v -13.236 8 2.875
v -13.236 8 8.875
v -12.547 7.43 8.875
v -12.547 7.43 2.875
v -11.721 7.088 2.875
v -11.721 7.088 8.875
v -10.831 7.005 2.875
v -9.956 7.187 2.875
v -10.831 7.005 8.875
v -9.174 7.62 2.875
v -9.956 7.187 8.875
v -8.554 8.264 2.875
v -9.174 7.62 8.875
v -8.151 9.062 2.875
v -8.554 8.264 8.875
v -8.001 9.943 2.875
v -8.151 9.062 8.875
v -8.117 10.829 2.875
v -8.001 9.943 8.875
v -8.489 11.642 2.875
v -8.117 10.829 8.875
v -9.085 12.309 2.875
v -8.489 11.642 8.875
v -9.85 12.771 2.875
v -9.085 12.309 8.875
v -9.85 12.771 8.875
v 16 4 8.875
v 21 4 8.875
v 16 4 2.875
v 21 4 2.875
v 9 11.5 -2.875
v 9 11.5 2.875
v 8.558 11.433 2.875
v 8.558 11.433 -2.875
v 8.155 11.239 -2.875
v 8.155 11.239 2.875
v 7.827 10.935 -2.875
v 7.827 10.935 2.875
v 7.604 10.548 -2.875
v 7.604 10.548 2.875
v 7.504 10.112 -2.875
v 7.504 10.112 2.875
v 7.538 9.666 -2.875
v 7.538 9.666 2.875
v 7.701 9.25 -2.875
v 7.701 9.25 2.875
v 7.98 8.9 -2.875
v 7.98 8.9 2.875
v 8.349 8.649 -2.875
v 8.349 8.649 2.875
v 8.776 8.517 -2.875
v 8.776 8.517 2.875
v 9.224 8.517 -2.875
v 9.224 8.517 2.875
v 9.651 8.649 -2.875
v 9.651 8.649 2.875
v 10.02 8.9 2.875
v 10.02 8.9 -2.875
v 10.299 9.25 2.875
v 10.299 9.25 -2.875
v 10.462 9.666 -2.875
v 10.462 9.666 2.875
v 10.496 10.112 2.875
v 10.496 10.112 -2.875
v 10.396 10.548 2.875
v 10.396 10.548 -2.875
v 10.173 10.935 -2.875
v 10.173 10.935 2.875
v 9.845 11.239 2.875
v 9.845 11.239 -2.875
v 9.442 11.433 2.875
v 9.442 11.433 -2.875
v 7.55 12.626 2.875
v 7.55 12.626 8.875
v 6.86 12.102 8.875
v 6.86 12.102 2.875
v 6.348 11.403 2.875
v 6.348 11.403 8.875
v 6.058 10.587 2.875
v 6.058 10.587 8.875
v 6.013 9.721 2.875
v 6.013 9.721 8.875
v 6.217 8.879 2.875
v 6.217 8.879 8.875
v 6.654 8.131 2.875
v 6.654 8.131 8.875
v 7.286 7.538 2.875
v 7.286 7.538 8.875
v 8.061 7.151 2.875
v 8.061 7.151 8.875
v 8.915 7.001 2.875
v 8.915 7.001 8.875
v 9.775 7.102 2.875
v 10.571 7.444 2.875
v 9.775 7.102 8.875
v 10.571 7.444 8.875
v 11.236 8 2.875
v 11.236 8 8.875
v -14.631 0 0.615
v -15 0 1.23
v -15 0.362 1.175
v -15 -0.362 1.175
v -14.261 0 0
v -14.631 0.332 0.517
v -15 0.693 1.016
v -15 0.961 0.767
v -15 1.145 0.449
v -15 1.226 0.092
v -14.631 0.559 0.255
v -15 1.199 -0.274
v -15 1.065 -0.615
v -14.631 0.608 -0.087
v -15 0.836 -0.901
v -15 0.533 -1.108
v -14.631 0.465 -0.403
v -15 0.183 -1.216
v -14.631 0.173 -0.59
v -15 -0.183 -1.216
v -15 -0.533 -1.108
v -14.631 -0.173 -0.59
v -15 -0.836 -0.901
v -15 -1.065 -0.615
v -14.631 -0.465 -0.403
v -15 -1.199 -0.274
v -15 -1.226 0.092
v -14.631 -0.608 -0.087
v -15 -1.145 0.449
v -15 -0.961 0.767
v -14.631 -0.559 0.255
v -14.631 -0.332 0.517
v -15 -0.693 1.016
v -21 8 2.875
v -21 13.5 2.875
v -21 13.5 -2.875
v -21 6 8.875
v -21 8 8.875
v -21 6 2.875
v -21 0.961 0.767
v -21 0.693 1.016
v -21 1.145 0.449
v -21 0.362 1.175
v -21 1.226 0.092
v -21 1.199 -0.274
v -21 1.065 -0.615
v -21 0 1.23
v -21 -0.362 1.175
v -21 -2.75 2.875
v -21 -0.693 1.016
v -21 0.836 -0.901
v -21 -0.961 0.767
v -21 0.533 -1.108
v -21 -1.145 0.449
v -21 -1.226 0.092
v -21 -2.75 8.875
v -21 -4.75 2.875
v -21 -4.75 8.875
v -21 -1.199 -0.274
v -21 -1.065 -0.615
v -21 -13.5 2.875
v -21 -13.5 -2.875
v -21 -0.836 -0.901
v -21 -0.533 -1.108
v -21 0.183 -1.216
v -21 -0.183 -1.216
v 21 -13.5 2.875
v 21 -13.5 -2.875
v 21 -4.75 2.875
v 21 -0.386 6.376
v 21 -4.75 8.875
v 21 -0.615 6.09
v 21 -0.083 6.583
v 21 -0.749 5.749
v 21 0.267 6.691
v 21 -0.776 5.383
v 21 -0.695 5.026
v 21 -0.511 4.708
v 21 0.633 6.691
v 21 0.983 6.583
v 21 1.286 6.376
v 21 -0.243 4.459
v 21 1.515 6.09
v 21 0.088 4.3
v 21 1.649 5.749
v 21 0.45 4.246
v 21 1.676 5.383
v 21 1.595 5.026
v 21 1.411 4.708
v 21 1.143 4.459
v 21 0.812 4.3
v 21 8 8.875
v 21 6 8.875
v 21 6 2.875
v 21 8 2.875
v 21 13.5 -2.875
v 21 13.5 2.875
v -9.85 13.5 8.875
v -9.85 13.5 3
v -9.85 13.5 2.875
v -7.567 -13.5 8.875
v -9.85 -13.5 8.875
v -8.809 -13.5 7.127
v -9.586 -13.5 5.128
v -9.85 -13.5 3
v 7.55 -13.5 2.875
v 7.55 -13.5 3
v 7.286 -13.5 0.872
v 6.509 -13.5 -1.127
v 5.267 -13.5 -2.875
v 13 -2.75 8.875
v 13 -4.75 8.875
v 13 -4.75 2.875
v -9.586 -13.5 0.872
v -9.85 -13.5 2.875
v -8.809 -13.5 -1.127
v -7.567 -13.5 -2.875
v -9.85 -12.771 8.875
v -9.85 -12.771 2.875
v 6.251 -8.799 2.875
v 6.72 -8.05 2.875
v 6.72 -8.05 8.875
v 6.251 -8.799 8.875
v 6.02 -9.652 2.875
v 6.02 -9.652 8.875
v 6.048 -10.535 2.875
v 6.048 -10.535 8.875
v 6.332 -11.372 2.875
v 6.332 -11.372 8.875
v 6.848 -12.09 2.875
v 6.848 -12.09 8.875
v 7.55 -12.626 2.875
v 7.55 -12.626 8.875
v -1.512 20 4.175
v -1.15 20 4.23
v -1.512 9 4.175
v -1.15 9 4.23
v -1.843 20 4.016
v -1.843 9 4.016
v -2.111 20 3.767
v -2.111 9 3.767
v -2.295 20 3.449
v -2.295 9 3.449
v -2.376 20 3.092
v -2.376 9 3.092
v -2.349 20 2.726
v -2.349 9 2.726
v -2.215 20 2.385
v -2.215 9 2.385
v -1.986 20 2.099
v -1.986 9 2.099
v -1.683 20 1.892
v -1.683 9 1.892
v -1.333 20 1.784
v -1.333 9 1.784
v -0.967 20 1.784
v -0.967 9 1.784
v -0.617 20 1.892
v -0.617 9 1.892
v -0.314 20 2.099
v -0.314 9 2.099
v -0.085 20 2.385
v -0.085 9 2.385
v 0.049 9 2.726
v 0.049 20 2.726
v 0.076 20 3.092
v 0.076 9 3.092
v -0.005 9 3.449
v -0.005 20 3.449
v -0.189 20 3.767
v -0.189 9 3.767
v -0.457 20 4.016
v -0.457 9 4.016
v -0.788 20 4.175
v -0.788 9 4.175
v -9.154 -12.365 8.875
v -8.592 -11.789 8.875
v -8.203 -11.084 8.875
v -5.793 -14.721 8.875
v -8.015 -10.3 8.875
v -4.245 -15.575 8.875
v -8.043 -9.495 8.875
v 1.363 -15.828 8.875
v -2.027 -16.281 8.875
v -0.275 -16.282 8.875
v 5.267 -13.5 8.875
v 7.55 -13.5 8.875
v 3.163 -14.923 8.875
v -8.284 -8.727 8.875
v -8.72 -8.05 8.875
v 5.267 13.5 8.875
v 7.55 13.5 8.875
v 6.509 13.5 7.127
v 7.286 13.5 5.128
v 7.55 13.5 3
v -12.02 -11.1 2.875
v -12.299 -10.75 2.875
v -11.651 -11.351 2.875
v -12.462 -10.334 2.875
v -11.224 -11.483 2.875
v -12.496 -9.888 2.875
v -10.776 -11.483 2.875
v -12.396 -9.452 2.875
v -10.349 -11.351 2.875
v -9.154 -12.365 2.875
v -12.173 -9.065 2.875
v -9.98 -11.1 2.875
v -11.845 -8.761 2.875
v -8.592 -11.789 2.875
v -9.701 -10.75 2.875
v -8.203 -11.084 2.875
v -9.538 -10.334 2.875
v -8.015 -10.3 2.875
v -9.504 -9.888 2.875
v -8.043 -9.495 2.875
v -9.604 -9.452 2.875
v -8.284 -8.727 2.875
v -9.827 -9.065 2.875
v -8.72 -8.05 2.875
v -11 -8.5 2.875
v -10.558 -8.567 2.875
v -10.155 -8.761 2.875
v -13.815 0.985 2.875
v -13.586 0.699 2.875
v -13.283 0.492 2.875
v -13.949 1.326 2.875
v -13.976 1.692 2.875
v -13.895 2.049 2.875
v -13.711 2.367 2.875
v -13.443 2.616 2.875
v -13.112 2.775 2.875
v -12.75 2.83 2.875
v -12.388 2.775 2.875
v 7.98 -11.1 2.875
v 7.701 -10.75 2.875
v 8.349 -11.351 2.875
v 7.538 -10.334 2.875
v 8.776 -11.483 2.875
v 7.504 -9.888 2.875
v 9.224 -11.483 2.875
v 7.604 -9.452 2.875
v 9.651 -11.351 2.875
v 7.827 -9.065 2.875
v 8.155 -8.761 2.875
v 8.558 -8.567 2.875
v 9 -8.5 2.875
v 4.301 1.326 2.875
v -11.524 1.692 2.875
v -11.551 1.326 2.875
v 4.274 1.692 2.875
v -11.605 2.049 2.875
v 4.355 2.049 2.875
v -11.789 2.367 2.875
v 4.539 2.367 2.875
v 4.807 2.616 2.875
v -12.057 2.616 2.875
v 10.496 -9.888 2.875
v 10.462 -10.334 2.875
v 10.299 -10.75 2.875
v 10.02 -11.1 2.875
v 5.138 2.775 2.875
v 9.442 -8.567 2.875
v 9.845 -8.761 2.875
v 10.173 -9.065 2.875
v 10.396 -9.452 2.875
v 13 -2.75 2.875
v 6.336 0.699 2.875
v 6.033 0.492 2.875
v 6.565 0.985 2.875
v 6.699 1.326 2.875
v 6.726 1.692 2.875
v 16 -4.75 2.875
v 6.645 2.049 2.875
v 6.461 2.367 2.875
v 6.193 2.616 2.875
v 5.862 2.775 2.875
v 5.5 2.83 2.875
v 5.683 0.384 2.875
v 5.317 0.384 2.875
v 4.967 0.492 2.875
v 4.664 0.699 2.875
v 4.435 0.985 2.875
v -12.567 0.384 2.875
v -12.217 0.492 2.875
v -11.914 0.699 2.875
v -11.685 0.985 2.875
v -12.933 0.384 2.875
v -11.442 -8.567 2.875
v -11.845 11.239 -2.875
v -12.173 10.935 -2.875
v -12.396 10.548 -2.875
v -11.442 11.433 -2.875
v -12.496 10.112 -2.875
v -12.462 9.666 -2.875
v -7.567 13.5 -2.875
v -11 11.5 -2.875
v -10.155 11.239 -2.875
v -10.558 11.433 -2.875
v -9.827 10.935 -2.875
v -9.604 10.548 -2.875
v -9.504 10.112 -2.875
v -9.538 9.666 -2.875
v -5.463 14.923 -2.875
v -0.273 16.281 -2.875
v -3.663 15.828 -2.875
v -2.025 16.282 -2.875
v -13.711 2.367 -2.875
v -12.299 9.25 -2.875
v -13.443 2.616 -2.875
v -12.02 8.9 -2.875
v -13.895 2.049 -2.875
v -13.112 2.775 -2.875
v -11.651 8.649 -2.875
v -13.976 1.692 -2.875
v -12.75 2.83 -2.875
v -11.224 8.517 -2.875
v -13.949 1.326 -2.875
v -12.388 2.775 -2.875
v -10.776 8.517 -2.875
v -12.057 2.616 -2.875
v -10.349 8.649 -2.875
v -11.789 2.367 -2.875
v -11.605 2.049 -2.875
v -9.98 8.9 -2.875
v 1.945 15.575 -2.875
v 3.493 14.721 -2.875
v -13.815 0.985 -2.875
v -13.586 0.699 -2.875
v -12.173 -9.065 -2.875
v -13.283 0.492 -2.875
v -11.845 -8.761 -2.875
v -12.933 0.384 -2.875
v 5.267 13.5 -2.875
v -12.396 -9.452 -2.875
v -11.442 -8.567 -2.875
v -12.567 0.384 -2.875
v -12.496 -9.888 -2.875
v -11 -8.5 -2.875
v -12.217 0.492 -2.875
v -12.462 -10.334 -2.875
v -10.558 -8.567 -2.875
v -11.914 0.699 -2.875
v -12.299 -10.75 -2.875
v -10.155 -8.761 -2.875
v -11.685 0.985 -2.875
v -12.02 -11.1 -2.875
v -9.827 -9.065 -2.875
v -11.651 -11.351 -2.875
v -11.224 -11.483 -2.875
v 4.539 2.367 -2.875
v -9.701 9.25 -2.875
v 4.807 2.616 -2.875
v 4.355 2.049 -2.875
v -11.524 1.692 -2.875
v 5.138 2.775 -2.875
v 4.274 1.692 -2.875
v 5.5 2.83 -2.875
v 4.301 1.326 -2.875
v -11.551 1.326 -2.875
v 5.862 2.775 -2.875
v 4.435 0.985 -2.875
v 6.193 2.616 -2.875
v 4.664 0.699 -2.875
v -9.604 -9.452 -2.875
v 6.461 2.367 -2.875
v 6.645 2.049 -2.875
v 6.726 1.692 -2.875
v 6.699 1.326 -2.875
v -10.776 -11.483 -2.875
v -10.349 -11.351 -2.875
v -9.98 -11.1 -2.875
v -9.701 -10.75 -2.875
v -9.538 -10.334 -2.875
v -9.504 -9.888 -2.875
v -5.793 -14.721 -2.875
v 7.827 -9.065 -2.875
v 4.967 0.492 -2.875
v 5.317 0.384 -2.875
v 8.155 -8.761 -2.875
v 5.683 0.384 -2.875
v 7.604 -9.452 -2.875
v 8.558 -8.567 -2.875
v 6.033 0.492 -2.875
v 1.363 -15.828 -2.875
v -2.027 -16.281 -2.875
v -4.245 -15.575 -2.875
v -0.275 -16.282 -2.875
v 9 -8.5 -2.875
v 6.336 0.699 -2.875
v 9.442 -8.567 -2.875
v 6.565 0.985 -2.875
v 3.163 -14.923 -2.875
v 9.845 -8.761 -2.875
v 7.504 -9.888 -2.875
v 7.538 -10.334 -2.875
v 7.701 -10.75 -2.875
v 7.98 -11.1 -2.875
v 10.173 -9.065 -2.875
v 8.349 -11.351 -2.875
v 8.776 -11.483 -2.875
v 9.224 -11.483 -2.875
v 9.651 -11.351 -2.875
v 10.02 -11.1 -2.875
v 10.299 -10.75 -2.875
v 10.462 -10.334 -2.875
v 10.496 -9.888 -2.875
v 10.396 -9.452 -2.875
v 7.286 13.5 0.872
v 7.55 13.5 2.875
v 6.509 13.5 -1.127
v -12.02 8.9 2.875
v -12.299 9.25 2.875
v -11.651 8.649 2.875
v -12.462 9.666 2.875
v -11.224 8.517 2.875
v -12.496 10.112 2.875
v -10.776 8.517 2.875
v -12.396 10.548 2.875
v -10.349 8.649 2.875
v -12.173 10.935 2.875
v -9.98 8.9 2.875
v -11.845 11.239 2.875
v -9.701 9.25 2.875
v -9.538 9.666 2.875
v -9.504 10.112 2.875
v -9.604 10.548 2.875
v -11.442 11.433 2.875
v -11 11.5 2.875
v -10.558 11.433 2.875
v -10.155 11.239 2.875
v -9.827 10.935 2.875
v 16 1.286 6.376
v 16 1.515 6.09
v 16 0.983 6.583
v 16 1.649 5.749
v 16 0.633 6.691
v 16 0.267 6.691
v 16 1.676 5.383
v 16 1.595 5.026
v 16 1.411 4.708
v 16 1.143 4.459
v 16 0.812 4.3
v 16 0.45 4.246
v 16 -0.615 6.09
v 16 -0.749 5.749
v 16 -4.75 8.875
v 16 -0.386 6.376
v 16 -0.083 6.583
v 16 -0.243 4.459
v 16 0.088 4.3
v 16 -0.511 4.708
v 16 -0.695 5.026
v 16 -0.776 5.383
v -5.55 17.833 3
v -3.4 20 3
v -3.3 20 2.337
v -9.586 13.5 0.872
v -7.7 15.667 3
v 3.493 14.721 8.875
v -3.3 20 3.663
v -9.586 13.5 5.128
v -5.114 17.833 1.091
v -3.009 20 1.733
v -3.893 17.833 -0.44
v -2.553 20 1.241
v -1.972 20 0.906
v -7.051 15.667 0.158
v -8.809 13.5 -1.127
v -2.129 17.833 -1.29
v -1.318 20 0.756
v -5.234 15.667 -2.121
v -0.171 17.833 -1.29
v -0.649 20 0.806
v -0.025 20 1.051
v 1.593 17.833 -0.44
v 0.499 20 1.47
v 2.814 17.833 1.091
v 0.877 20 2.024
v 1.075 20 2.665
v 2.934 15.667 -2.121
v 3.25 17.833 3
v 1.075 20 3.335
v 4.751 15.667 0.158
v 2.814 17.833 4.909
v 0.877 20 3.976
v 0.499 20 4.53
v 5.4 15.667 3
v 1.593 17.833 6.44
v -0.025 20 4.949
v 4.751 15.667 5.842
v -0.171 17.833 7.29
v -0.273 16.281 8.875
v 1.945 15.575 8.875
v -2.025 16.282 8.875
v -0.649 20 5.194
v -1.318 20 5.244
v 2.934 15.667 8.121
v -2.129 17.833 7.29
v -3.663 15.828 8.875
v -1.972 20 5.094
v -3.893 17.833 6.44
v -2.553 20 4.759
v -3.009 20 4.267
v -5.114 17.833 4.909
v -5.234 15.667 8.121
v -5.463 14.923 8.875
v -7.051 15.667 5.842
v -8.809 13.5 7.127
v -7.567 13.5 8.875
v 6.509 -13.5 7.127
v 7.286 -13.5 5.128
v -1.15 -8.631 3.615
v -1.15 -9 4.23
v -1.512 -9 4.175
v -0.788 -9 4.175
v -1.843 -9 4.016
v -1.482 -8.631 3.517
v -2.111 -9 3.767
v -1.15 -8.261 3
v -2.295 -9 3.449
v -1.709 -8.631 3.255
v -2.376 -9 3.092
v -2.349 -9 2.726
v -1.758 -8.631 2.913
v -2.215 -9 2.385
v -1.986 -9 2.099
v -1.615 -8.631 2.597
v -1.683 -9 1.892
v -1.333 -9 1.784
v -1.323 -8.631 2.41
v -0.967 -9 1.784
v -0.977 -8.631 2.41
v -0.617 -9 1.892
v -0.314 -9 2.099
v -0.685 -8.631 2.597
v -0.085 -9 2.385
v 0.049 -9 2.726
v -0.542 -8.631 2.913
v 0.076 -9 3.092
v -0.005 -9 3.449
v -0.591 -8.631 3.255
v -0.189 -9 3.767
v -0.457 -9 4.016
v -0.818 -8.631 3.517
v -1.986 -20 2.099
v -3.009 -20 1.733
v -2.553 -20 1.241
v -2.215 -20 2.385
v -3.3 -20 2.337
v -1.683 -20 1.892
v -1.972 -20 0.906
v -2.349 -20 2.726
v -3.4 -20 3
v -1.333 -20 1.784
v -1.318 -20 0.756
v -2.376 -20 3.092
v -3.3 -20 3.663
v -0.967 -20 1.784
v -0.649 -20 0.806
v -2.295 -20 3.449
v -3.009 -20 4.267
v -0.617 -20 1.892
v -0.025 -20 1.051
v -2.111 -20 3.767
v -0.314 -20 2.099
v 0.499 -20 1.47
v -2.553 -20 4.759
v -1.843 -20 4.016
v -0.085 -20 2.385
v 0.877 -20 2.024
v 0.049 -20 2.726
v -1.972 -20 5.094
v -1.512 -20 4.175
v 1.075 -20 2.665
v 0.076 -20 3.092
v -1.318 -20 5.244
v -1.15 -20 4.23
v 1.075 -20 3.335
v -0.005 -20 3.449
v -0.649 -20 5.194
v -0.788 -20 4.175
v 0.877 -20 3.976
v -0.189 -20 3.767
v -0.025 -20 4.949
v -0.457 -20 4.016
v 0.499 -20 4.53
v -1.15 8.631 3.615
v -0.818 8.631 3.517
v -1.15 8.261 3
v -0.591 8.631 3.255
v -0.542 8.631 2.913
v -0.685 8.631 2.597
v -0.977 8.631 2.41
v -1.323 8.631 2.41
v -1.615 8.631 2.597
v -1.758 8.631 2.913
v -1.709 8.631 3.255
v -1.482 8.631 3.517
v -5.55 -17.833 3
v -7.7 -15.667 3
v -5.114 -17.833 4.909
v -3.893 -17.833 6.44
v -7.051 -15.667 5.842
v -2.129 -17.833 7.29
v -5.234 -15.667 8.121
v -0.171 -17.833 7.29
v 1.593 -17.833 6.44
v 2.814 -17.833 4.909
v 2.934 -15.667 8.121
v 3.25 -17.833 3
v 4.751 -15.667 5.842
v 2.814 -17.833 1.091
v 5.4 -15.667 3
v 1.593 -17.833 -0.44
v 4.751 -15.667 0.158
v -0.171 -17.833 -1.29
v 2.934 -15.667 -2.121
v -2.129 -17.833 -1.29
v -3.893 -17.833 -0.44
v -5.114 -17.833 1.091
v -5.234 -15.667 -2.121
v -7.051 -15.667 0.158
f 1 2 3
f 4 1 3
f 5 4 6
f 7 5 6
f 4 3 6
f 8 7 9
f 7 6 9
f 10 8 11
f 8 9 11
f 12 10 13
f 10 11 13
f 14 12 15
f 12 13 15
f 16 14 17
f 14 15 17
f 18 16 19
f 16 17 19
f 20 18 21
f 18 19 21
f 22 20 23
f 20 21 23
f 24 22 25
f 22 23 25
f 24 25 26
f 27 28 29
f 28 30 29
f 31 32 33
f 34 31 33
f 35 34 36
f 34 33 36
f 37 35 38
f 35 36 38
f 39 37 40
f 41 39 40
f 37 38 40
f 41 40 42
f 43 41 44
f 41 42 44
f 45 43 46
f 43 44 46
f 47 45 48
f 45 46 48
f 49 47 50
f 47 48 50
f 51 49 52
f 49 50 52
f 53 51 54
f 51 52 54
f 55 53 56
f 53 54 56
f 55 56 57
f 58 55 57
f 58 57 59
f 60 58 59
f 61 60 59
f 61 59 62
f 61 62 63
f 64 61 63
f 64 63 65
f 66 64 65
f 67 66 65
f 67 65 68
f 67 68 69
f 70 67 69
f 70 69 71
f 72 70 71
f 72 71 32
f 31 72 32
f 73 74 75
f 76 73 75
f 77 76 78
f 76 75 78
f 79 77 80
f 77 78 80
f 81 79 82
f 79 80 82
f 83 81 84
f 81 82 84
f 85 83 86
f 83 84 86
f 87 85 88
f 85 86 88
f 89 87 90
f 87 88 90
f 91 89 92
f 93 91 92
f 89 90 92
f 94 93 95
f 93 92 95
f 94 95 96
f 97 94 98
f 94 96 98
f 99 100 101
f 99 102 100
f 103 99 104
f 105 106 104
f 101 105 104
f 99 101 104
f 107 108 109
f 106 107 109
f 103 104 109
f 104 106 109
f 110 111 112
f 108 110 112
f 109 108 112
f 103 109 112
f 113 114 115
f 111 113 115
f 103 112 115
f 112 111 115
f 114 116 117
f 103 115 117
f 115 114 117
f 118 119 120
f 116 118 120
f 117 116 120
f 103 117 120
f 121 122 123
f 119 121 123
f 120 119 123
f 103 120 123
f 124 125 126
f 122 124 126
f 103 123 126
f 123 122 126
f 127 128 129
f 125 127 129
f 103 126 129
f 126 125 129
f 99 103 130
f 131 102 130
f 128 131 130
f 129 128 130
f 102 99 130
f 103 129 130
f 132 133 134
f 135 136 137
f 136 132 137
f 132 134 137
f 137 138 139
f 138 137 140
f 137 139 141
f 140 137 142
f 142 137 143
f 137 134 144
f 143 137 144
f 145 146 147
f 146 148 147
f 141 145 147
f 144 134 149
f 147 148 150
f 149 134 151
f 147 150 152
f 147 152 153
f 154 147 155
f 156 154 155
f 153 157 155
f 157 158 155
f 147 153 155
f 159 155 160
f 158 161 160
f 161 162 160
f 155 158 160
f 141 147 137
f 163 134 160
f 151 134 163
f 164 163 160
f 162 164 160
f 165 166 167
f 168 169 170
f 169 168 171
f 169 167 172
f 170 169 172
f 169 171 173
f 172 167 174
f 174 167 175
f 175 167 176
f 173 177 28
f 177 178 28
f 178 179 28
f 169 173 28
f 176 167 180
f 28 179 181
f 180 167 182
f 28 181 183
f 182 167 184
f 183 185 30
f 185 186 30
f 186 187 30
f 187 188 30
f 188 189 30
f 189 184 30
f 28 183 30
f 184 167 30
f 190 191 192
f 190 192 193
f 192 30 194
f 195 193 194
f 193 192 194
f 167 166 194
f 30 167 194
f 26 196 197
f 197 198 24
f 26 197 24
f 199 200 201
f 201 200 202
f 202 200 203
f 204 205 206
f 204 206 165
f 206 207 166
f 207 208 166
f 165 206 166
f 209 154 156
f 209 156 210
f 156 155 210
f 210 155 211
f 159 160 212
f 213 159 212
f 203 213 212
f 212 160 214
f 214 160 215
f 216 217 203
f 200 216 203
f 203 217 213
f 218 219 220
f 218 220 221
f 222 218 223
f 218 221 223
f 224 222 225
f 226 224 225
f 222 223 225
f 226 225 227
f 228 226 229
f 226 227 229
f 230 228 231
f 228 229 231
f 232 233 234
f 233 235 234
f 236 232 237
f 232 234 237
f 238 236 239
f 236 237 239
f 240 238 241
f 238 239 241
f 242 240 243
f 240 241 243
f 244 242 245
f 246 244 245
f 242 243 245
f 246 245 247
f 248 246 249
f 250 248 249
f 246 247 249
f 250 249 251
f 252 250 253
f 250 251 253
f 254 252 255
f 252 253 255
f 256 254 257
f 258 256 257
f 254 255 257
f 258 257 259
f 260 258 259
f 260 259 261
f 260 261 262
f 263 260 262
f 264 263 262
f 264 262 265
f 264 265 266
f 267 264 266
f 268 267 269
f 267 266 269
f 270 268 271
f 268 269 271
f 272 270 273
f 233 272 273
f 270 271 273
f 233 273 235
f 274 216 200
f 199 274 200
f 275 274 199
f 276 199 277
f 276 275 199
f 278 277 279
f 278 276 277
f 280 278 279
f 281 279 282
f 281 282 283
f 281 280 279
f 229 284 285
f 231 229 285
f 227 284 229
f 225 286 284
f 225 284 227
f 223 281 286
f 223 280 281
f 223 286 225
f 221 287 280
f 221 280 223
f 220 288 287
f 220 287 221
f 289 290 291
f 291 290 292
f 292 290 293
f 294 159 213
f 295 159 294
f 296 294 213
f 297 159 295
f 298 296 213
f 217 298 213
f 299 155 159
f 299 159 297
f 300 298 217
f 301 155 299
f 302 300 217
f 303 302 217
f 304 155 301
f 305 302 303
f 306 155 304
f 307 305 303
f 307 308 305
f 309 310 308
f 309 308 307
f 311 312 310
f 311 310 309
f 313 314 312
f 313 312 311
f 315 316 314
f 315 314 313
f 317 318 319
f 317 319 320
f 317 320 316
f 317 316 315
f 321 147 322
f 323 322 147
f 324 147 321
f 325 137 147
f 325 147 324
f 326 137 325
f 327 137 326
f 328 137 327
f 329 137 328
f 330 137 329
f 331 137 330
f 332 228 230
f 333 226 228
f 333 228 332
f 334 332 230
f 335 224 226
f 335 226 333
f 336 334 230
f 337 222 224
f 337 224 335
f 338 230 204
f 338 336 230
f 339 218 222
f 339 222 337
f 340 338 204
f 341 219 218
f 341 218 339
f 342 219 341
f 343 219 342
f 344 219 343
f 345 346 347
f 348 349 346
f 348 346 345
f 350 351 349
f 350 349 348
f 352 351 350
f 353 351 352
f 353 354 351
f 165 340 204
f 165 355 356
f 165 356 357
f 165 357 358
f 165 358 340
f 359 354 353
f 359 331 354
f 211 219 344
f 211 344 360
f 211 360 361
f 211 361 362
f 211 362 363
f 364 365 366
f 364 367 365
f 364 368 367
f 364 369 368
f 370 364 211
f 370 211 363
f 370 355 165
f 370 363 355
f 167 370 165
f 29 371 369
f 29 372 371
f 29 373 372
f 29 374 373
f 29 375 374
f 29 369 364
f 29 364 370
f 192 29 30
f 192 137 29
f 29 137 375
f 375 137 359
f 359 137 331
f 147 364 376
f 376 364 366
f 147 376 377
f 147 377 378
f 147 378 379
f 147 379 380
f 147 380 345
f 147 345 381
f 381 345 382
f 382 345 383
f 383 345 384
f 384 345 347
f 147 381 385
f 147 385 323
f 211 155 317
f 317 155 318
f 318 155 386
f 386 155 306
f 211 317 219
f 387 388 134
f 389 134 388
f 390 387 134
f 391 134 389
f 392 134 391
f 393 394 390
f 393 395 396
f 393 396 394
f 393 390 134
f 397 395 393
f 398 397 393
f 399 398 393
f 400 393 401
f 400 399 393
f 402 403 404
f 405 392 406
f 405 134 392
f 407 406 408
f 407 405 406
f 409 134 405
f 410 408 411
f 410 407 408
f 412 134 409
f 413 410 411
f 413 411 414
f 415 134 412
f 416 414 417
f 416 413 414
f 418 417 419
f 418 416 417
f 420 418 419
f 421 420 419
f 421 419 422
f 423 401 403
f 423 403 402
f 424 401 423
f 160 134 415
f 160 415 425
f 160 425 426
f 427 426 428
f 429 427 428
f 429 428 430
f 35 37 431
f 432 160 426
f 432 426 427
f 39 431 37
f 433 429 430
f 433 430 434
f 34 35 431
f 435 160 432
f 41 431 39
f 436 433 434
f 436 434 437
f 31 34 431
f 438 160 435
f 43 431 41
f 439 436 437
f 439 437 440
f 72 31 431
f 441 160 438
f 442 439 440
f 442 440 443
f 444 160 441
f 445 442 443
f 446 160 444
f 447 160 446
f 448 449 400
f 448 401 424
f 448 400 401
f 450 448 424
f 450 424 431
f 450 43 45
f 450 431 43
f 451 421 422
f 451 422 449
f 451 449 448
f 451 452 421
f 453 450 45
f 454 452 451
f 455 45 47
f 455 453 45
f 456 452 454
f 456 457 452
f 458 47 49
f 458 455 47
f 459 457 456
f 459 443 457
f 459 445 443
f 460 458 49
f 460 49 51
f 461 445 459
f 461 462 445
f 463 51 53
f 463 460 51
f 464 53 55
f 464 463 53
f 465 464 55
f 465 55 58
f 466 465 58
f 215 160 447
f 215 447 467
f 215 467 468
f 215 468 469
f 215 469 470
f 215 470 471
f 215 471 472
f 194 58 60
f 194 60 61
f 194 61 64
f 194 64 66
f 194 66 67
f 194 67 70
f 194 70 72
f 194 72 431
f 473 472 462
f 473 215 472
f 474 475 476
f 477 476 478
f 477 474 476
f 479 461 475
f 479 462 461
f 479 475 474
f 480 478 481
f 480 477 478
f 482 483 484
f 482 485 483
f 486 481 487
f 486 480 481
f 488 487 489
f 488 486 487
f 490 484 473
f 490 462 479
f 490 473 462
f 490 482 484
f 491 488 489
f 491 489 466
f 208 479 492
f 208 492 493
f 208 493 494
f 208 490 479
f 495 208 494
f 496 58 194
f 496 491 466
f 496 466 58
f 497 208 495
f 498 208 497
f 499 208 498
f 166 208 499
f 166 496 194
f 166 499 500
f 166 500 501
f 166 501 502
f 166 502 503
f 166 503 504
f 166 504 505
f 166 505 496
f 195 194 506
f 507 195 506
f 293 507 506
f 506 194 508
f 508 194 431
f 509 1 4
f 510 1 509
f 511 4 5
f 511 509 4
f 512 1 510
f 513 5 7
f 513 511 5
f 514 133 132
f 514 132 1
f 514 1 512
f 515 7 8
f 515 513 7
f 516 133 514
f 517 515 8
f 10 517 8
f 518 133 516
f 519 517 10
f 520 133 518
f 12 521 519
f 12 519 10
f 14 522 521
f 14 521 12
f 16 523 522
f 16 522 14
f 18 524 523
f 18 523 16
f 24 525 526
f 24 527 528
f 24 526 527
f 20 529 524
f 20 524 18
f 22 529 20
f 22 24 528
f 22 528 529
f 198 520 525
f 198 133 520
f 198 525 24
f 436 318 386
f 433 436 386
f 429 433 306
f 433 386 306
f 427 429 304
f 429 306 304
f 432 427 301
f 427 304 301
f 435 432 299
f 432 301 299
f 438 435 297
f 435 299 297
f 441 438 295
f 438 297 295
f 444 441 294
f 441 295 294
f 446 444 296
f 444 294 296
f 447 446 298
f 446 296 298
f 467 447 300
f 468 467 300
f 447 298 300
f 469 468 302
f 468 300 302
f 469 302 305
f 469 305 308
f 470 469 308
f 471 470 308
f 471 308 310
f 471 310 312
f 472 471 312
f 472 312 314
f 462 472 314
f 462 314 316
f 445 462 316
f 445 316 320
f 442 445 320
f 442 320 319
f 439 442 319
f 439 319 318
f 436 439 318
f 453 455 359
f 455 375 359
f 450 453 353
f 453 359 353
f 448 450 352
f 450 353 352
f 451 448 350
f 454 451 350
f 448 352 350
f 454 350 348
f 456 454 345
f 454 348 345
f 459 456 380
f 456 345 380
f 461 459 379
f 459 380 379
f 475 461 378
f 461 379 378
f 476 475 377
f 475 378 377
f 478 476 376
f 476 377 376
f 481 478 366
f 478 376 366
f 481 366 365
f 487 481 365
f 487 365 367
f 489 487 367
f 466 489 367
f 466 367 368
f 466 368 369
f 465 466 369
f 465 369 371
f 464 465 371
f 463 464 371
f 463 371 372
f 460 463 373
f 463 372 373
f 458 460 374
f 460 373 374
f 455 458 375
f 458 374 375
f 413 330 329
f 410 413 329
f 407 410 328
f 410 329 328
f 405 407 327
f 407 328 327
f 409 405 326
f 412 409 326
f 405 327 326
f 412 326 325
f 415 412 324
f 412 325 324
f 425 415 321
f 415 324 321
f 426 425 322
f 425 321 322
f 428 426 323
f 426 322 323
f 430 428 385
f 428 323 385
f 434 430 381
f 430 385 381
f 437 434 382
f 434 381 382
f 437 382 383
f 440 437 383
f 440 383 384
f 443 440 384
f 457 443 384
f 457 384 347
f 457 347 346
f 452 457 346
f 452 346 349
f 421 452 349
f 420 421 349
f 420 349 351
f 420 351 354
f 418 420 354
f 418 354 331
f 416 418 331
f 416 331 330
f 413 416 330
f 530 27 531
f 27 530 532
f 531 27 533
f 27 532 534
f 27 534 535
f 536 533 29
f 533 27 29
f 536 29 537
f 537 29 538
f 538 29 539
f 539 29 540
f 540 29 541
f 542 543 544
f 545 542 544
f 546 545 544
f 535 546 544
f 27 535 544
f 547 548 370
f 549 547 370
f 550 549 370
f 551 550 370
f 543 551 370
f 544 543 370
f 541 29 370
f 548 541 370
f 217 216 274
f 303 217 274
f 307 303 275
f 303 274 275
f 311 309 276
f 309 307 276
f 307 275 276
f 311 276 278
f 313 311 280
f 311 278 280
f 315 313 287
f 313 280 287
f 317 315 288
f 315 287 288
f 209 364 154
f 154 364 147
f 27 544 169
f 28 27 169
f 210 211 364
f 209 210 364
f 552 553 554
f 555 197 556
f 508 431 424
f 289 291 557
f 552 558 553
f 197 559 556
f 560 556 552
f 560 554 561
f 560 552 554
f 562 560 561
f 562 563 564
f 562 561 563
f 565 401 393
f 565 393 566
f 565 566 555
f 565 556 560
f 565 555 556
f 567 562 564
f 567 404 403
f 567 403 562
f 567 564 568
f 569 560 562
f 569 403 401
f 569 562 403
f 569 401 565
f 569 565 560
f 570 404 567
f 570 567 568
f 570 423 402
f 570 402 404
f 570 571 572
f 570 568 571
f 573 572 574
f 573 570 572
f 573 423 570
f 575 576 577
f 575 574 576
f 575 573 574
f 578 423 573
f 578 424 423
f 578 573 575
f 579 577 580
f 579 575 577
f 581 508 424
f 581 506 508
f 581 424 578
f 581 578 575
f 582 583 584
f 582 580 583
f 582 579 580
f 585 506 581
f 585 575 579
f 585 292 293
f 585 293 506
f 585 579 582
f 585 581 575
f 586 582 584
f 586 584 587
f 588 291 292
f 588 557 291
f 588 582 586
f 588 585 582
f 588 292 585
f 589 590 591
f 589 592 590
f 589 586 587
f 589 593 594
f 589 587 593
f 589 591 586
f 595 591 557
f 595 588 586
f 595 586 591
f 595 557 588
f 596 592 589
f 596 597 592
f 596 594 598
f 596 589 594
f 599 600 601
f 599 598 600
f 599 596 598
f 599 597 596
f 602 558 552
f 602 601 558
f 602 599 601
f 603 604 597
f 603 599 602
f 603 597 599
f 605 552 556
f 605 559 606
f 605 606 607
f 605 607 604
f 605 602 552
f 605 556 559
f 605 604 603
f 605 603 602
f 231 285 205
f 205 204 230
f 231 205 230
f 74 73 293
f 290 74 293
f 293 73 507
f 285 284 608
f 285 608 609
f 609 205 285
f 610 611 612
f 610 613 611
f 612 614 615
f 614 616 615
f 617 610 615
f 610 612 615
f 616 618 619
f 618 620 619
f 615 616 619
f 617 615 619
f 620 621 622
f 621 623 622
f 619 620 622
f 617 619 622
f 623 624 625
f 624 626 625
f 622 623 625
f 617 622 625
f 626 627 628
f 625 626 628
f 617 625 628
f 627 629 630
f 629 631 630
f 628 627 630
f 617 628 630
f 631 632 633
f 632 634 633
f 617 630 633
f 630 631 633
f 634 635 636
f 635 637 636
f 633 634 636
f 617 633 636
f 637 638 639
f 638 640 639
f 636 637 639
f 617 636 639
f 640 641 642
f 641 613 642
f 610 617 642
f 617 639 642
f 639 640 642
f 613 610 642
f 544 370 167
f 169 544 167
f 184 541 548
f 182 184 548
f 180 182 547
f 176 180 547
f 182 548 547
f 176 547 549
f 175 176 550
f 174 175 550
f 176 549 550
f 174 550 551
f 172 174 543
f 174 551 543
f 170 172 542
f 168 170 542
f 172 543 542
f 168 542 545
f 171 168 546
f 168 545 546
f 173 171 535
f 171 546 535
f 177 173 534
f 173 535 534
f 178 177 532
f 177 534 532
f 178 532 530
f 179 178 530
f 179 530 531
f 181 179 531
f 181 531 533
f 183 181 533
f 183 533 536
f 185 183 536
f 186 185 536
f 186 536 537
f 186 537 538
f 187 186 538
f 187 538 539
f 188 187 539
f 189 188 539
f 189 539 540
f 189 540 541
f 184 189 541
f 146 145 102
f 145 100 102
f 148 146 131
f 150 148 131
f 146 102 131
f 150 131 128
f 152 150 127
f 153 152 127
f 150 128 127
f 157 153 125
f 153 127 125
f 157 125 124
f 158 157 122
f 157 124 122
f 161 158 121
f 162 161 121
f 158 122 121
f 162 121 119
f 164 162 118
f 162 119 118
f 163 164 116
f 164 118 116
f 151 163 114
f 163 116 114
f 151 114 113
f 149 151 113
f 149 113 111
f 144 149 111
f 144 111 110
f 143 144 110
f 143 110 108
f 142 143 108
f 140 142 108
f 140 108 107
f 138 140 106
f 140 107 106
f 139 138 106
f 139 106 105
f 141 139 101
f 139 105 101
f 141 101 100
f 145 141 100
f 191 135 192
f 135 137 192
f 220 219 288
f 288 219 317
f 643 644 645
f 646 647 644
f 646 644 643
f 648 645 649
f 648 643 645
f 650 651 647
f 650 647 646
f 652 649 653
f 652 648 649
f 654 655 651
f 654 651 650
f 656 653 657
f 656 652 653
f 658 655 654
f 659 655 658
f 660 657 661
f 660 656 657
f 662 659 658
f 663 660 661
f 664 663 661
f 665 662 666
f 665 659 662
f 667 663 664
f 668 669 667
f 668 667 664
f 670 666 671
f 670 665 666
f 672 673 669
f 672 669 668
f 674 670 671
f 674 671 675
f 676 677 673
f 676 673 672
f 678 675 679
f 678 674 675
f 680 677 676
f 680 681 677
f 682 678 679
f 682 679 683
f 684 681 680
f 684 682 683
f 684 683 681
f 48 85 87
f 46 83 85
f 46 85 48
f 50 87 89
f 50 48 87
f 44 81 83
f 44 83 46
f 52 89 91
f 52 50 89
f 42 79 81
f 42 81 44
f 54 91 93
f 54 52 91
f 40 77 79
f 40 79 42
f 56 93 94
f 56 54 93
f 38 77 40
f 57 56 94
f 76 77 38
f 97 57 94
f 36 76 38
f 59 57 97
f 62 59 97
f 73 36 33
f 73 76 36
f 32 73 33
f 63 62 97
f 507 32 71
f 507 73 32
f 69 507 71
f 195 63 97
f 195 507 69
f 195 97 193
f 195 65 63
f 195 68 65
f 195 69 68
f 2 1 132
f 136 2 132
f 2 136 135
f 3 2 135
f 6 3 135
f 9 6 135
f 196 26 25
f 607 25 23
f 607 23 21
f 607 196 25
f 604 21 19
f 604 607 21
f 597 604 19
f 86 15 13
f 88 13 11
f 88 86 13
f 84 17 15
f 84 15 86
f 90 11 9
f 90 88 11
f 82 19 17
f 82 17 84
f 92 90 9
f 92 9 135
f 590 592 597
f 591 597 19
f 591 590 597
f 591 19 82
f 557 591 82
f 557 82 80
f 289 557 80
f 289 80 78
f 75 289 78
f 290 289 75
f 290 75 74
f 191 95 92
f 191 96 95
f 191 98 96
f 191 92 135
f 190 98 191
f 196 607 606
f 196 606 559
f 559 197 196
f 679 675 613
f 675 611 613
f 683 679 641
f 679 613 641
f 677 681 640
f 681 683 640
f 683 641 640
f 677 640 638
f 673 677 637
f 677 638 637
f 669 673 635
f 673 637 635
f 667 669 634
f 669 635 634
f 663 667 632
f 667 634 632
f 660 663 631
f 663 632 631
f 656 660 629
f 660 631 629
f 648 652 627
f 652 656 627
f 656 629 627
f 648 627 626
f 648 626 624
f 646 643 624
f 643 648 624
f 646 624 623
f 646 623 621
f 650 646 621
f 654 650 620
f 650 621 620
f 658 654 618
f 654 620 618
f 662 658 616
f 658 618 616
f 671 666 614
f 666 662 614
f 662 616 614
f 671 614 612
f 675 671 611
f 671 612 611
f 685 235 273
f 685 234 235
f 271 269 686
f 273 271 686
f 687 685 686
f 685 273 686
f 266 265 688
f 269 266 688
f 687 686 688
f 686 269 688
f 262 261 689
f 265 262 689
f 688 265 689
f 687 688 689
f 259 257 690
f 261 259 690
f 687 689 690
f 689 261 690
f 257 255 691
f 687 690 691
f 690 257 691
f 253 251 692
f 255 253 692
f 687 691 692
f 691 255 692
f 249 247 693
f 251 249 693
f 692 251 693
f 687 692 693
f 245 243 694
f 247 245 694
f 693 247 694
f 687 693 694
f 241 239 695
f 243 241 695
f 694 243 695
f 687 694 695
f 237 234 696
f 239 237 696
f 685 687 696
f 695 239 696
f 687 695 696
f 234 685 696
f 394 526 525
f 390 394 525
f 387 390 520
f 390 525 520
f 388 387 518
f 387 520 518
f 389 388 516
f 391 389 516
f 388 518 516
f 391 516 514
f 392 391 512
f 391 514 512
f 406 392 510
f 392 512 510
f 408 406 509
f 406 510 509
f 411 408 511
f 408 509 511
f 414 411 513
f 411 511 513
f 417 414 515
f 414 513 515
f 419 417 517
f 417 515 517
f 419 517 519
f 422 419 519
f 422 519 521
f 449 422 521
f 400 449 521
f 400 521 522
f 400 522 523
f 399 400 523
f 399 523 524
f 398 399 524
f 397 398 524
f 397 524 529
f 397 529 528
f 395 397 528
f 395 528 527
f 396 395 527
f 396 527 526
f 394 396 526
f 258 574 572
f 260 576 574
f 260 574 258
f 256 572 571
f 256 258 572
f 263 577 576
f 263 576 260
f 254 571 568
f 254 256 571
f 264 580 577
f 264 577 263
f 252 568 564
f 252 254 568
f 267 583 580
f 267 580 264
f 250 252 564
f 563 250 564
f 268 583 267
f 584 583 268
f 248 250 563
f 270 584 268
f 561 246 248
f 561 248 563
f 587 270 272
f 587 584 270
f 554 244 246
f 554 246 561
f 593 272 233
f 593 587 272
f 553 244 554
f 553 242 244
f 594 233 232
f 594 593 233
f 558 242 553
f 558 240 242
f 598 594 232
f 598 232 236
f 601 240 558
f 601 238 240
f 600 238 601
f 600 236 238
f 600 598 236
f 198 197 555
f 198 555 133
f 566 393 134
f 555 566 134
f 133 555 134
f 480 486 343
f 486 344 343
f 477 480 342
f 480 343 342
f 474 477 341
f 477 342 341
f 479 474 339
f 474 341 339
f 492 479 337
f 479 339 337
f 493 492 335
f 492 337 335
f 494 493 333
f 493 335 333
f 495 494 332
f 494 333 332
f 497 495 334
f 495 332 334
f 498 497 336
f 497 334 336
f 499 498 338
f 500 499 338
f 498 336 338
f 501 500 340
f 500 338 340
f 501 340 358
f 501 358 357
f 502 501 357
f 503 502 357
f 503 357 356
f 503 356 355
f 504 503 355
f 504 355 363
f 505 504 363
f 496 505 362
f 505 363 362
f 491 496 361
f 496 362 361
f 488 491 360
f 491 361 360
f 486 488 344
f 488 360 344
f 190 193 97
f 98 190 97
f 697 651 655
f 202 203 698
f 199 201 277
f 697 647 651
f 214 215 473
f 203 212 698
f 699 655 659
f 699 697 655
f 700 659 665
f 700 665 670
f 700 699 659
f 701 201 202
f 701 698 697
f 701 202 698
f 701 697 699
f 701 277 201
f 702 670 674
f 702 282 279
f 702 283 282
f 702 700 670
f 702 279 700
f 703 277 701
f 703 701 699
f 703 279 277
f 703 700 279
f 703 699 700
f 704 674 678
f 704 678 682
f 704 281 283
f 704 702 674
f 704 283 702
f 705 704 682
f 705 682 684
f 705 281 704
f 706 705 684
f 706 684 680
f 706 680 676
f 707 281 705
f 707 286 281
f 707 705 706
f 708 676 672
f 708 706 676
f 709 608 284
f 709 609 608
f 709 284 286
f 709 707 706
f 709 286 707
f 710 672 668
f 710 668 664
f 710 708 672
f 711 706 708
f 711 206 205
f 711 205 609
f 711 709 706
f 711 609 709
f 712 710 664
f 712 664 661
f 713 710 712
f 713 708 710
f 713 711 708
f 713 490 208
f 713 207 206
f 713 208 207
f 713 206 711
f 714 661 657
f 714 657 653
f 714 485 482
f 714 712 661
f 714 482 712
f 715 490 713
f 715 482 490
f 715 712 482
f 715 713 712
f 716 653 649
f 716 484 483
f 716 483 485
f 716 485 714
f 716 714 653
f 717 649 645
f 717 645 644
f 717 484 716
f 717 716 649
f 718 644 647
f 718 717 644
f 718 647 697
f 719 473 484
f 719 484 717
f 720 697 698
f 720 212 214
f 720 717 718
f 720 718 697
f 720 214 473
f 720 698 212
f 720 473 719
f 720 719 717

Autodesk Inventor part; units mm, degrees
ref_plane "YZ Plane" through (0, 0, 0) normal (1, 0, 0) x (0, 1, 0)
ref_plane "XZ Plane" through (0, 0, 0) normal (0, 1, 0) x (-1, 0, 0)
sketch "Esquisse1" plane through (0, 0, 0) normal (0, 0, 1) x (1, 0, 0)
  line L0 (-21, -13.5) -> (21, -13.5)
  line L1 (21, -13.5) -> (21, 13.5)
  line L2 (21, 13.5) -> (-21, 13.5)
  line L3 (-21, 13.5) -> (-21, -13.5)
  line L4 (-21, -13.5) -> (21, 13.5) construction
  line L5 (21, -13.5) -> (-21, 13.5) construction
  point P0 (0, 0)
  dimension "d0" = 42
  dimension "d1" = 27
extrude "Extrusion1" add sketch "Esquisse1" along normal mid plane 5.75
sketch "Esquisse2" plane through (0, 0, 2.875) normal (0, 0, 1) x (1, 0, 0)
  line L0 (16, -4.75) -> (21, -4.75)
  line L1 (21, -4.75) -> (21, 4)
  line L2 (21, 4) -> (16, 4)
  line L3 (16, 4) -> (16, -4.75)
  line L4 (-21, 6) -> (21, 6)
  line L5 (21, 6) -> (21, 8)
  line L6 (21, 8) -> (-21, 8)
  line L7 (-21, 8) -> (-21, 6)
  line L8 (-21, -4.75) -> (13, -4.75)
  line L9 (13, -4.75) -> (13, -2.75)
  line L10 (13, -2.75) -> (-21, -2.75)
  line L11 (-21, -2.75) -> (-21, -4.75)
  line L12 (-21, -13.5) -> (21, -13.5) construction
  line L13 (21, -13.5) -> (21, 13.5) construction
  line L14 (21, 13.5) -> (-21, 13.5) construction
  line L15 (-21, 13.5) -> (-21, -13.5) construction
  point P0 (0, 0)
  dimension "d4" = 2
  dimension "d5" = 2
  dimension "d6" = 5
  dimension "d7" = 8.75
  dimension "d8" = 2
  dimension "d9" = 5.5
  dimension "d10" = 34
extrude "Extrusion2" add sketch "Esquisse2" along normal blind 6
sketch "Esquisse3" plane through (0, 0, 2.875) normal (0, 0, 1) x (1, 0, 0)
  line L0 (-9.85, 8) -> (7.55, 8)
  line L1 (7.55, 8) -> (7.55, 13.5)
  line L2 (7.55, 13.5) -> (-9.85, 13.5)
  line L3 (-9.85, 13.5) -> (-9.85, 8)
  line L4 (-21, 6) -> (21, 6) construction
  line L5 (21, 6) -> (21, 8) construction
  line L6 (21, 8) -> (-21, 8) construction
  line L7 (-21, 8) -> (-21, 6) construction
  line L8 (-21, 8) -> (21, 8) construction
  line L9 (21, 8) -> (21, 13.5) construction
  line L10 (21, 13.5) -> (-21, 13.5) construction
  line L11 (-21, 13.5) -> (-21, 8) construction
  line L12 (21, 8) -> (-21, 8) construction
  line L13 (-21, -13.5) -> (21, -13.5) projected
  line L14 (-9.85, -13.5) -> (7.55, -13.5)
  line L15 (7.55, -13.5) -> (7.55, -8.05)
  line L16 (7.55, -8.05) -> (-9.85, -8.05)
  line L17 (-9.85, -8.05) -> (-9.85, -13.5)
  line L18 (-21, -4.75) -> (13, -4.75) projected
  point P0 (0, 0)
  dimension "d13" = 17.4
  dimension "d14" = 11.15
  dimension "d17" = 3.3
extrude "Extrusion3" add sketch "Esquisse3" along normal up to surface (6 mm away)
ref_plane "Plan de construction1" through (-9.85, -13.5, 3) normal (0, 0, 1) x (1, 0, 0)
sketch "Esquisse5" plane through (-9.85, -13.5, 3) normal (0, 0, 1) x (1, 0, 0)
  line L0 (8.7, 27) -> (8.7, 37.7161)
  line L1 (0, 27) -> (17.4, 27) projected
  line L2 (0, 27) -> (6.45, 33.5)
  line L3 (6.45, 33.5) -> (8.7, 33.5)
  line L4 (0, 27) -> (8.7, 27)
  line L5 (-11.15, 27) -> (30.85, 27) projected
  point P0 (9.85, 13.5)
  dimension "d18" = 4.5
  dimension "d19" = 6.5
revolve "Révolution1" add sketch "Esquisse5" angle 360 about axis through (-1.15, 13.5, 3) along (0, 1, 0)
sketch "Esquisse7" plane through (-1.15, 20, 3) normal (0, 1, 0) x (1, 0, 0)
  circle A0 centre (0, 0) radius 2.25 construction
  point P0 (1.15, 3)
hole "Perçage1" at (-1.15, 20, 3) direction (0, -1, 0) diameter 2.459 depth 11 tip angle 118 thread size "M3x0.5" class "6H" standard "ISO Metric profile"
mirror "Symétrie2" about plane through (0, 0, 0) normal (0, 1, 0) of "Révolution1", "Perçage1"
sketch "Esquisse6" plane through (0, 0, 0) normal (0, 1, 0) x (-1, 0, 0)
  line L0 (7.5667, 8.875) -> (-5.2667, 8.875) projected
  arc A0 (7.5667, 8.875) -> (-5.2667, 8.875) centre (1.15, 3) ccw projected
  line L1 (7.5667, -2.875) -> (-5.2667, -2.875) projected
  arc A1 (-5.2667, -2.875) -> (7.5667, -2.875) centre (1.15, 3) ccw projected
  point P0 (0, 0)
extrude "Extrusion4" cut sketch "Esquisse6" along normal through all both and the other way through all
sketch "Esquisse8" plane through (-21, -13.5, -2.875) normal (-1, 0, 0) x (0, 0, 1)
  point P0 (2.875, 13.5)
  point P1 (2.875, 13.5)
hole "Perçage2" at (-21, 0, 0) direction (1, 0, 0) diameter 2.459 depth 6 tip angle 118 thread size "M3x0.5" class "6H" standard "ISO Metric profile"
sketch "Esquisse9" plane through (21, -13.5, -2.875) normal (1, 0, 0) x (0, 0, -1)
  line L0 (-11.75, 8.75) -> (-11.75, 17.5) projected
  line L1 (-5.75, 17.5) -> (-11.75, 17.5) projected
  point P0 (-2.875, 13.5)
  point P1 (-8.35, 13.95)
  dimension "d37" = 3.4
  dimension "d38" = 3.55
hole "Perçage3" at (21, 0.45, 5.475) direction (-1, 0, 0) diameter 2.459 end through all thread size "M3x0.5" class "6H" standard "ISO Metric profile"
sketch "Esquisse10" plane through (0, 0, -2.875) normal (0, 0, -1) x (-1, 0, 0)
  line L0 (21, -13.5) -> (21, 13.5) projected
  point P0 (0, 0)
  point P1 (-9, -10)
  point P2 (-9, 10)
  point P3 (11, 10)
  point P4 (11, -10)
  dimension "d46" = 20
  dimension "d47" = 20
  dimension "d48" = 10
  dimension "d49" = 10
hole "Perçage4" at (9, -10, -2.875) at (9, 10, -2.875) at (-11, 10, -2.875) at (-11, -10, -2.875) direction (0, 0, 1) diameter 3 end through all
sketch "Esquisse11" plane through (0, 0, -2.875) normal (0, 0, -1) x (-1, 0, 0)
  line L0 (21, -13.5) -> (21, 13.5) projected
  line L1 (21, 13.5) -> (7.5667, 13.5) projected
  point P0 (0, 0)
  point P1 (-5.5, 1.6)
  point P2 (12.75, 1.6)
  dimension "d57" = 18.25
  dimension "d58" = 8.25
  dimension "d59" = 11.9
hole "Perçage5" at (5.5, 1.6, -2.875) at (-12.75, 1.6, -2.875) direction (0, 0, 1) diameter 2.459 end through all thread size "M3x0.5" class "6H" standard "ISO Metric profile"
sketch "Esquisse12" plane through (-9.85, -8.05, 8.875) normal (0, 0, 1) x (1, 0, 0)
  arc A0 (17.4, -2.3341) -> (17.4, -1.5659) centre (18.85, -1.95) ccw construction
  arc A1 (0, -0.9869) -> (0, -2.9131) centre (-1.15, -1.95) ccw construction
  arc A2 (0, 19.0131) -> (0, 17.0869) centre (-1.15, 18.05) ccw construction
  arc A3 (17.4, 17.6659) -> (17.4, 18.4341) centre (18.85, 18.05) ccw construction
  circle A4 centre (18.85, -1.95) radius 3
  circle A5 centre (-1.15, -1.95) radius 1.5 projected
  circle A6 centre (-1.15, -1.95) radius 3
  circle A7 centre (-1.15, 18.05) radius 3
  circle A8 centre (18.85, 18.05) radius 1.5 projected
  circle A9 centre (18.85, 18.05) radius 3
  point P0 (9.85, 8.05)
  dimension "d67" = 6
  dimension "d68" = 6
  dimension "d69" = 6
  dimension "d70" = 6
extrude "Extrusion5" cut sketch "Esquisse12" against normal up to surface (6 mm away)
equation "\"d48\" = 0.5 * d47"
equation "\"d68\" = d67"
equation "\"d69\" = d67"
equation "\"d70\" = d68"
properties part number "Platine" material "Aluminium"
